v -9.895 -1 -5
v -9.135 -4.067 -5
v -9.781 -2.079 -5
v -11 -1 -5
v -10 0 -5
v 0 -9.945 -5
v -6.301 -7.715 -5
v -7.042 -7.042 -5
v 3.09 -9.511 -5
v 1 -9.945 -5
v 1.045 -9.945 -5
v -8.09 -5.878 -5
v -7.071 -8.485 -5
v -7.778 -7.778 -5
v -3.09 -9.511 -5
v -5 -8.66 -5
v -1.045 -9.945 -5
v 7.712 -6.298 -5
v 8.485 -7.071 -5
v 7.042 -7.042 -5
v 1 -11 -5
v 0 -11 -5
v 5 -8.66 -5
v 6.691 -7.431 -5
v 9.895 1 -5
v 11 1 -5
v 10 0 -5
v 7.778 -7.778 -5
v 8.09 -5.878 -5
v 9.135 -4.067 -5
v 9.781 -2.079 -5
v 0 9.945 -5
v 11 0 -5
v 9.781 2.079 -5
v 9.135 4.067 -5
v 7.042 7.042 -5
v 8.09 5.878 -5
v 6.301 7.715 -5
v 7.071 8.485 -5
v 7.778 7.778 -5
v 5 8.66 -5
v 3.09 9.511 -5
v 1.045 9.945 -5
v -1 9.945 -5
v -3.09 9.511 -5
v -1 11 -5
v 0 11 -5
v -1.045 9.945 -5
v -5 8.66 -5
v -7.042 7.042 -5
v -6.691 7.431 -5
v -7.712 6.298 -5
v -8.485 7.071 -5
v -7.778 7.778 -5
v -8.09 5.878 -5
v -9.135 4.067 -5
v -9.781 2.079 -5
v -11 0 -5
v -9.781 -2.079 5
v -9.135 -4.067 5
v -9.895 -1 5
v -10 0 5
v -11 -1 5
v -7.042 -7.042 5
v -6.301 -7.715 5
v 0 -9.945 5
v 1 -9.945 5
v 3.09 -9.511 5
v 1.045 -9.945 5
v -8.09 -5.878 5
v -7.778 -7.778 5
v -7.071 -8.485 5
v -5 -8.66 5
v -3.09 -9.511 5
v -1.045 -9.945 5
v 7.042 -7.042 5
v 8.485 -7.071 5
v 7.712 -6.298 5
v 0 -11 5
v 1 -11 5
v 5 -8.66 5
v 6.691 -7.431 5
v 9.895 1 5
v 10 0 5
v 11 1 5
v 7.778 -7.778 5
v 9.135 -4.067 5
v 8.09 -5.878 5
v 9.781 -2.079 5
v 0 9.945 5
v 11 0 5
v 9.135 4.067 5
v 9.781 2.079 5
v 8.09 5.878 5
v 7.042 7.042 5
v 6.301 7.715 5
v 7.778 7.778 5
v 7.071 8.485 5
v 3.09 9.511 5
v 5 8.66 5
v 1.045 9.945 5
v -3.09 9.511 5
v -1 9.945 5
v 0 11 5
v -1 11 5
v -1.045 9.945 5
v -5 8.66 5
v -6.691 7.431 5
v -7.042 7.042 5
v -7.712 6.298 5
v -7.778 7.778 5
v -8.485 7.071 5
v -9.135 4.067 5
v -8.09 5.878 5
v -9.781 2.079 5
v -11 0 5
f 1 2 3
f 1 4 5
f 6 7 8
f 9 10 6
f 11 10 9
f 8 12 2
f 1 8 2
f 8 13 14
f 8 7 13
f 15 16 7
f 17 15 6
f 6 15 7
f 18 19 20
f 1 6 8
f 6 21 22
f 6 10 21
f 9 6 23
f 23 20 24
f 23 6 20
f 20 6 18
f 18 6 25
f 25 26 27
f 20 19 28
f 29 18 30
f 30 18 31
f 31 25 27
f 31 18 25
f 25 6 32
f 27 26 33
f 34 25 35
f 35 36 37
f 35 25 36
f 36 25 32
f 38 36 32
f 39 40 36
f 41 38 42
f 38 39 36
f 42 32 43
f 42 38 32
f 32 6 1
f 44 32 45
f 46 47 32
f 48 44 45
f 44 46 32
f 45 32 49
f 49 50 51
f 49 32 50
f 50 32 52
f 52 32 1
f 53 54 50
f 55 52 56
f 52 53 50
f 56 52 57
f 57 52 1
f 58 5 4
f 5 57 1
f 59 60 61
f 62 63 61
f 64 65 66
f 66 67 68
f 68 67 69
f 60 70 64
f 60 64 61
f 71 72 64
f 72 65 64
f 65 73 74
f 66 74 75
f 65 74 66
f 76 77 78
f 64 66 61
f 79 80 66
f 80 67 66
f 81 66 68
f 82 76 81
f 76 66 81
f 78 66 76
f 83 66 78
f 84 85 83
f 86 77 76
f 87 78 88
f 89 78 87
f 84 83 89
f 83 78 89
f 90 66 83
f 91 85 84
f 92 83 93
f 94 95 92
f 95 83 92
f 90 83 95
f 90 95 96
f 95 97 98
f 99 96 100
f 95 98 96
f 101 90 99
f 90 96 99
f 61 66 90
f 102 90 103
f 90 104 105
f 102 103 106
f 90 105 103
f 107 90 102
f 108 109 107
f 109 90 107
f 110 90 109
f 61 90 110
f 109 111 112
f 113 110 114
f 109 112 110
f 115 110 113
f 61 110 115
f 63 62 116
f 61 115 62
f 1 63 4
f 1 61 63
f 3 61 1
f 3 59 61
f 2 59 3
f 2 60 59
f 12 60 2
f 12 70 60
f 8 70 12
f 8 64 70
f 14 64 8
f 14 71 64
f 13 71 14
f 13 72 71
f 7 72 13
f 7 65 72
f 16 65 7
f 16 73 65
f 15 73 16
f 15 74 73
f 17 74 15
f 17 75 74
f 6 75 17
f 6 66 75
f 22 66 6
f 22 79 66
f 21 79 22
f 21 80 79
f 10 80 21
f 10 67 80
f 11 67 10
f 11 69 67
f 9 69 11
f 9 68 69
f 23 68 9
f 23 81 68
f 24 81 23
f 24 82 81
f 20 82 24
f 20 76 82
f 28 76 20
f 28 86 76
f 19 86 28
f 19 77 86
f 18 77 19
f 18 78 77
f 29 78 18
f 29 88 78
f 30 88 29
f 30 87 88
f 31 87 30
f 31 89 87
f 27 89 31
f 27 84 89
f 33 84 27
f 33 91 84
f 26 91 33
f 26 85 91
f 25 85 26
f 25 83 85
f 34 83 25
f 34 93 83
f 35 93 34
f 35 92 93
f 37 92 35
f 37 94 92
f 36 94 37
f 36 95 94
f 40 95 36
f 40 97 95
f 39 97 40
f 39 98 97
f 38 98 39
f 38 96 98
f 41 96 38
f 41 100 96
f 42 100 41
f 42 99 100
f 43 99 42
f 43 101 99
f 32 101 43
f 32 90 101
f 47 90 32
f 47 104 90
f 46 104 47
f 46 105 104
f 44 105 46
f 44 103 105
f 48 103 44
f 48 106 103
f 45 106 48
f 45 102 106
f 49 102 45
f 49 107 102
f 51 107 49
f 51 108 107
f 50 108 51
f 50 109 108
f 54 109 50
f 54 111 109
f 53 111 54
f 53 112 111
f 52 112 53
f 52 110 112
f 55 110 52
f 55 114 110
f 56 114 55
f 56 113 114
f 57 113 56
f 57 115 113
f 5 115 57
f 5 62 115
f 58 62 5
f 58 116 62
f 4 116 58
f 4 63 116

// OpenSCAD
linear_extrude(height=10, center=true, convexity=10, twist=0) {
    circle(10); 

for (angle=[0:45:315]) {
    rotate([0, 0, angle]) translate([9, 0, 0]) square([2,1]);
}
}
